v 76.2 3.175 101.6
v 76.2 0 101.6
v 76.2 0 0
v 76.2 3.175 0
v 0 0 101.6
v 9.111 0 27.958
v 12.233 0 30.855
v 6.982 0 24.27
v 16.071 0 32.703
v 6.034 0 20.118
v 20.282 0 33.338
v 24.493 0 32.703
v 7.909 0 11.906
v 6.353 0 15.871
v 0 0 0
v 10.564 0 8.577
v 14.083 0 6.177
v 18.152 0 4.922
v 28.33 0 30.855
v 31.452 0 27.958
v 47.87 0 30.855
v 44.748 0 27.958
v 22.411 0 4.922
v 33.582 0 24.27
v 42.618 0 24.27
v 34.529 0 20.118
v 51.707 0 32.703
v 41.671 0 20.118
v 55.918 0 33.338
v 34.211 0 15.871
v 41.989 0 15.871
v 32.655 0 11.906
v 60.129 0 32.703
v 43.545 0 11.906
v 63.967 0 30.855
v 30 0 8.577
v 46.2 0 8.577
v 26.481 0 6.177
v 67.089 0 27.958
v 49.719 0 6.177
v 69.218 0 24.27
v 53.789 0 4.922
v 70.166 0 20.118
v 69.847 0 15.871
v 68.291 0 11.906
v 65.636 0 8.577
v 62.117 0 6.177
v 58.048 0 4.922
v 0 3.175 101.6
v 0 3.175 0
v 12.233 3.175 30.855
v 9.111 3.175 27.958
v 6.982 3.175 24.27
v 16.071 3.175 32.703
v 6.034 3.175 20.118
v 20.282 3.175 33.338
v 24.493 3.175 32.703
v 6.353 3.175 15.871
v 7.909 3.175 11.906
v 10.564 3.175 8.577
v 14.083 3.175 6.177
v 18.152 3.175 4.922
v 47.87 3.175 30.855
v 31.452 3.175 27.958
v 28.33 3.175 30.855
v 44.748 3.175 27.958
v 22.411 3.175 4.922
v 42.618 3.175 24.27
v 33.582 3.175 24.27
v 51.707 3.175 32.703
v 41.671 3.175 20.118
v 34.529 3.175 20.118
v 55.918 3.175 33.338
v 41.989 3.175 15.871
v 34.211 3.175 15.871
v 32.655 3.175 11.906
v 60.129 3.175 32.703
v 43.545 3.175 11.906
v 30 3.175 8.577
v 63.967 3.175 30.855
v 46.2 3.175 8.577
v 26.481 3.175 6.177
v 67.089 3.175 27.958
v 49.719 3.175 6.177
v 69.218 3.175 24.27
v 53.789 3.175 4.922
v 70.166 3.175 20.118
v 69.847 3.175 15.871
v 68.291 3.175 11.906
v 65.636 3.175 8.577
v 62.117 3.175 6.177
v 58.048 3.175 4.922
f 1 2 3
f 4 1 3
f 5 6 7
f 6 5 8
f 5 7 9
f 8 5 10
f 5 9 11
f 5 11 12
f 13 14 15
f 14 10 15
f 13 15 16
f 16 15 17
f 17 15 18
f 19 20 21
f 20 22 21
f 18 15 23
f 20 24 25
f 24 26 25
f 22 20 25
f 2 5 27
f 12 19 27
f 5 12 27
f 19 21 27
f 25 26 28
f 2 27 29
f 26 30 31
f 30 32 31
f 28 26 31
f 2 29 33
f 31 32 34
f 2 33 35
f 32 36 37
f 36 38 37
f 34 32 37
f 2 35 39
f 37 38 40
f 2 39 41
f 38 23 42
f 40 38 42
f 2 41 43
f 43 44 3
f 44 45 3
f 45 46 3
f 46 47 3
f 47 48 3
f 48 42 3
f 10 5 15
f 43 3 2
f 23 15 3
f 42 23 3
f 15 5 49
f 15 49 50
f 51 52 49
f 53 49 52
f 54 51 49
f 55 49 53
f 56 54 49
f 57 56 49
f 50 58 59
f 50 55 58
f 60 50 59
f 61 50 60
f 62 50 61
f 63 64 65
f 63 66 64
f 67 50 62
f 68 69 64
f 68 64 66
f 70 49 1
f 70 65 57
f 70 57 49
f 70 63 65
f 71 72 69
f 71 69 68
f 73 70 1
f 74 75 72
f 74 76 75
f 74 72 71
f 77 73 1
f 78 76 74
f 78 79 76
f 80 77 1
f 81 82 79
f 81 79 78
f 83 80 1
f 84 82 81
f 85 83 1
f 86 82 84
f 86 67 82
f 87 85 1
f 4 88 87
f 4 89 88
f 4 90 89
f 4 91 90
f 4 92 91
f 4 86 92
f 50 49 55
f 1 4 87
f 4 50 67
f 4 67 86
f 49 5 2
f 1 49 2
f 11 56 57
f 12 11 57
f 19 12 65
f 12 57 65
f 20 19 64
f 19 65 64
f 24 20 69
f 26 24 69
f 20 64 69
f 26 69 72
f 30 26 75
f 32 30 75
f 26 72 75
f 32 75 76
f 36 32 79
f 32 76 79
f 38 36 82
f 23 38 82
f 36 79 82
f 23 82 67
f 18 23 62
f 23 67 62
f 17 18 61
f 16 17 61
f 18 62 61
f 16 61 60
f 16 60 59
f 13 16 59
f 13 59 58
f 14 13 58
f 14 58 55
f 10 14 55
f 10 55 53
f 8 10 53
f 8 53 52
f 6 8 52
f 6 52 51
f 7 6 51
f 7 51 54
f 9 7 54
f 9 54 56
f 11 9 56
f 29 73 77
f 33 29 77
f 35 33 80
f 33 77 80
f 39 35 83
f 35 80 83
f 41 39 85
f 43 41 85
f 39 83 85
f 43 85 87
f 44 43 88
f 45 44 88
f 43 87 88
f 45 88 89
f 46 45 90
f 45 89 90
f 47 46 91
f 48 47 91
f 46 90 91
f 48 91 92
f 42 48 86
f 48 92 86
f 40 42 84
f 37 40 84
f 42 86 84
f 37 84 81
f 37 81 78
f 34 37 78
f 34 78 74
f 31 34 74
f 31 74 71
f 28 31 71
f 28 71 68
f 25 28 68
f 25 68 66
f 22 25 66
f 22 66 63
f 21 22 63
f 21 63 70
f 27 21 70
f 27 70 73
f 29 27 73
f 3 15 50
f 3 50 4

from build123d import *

# Parameters (mm, degrees)
SKETCH1_W           = 76.2
SKETCH1_H           = 101.6
BOSS_EXTRUDE1_DEPTH = 3.175
SKETCH2_R           = 14.2875
CUT_EXTRUDE1_DEPTH  = 28.575


with BuildPart() as part:
    # Sketch1 → Boss-Extrude1 (new body)
    with BuildSketch(Plane(origin=(0, 0, 0), x_dir=(1, 0, 0), z_dir=(0, 1, 0))):
        with Locations((38.1, -50.8)):
            Rectangle(SKETCH1_W, SKETCH1_H)
        Polygon((27.614248419, -19.05), (23.948074209, -12.7), (16.615725791, -12.7), (12.949551581, -19.05), (16.615725791, -25.4), (23.948074209, -25.4), align=None, mode=Mode.SUBTRACT)
        Polygon((55.9181, -11.717651581), (49.5681, -15.383825791), (49.5681, -22.716174209), (55.9181, -26.382348419), (62.2681, -22.716174209), (62.2681, -15.383825791), align=None, mode=Mode.SUBTRACT)
    extrude(amount=BOSS_EXTRUDE1_DEPTH)

    # Sketch2 → Cut-Extrude1 (cut)
    with BuildSketch(Plane(origin=(0, 3.175, 0), x_dir=(1, 0, 0), z_dir=(0, 1, 0))):
        with Locations(Location((20.2819, -19.05, 0), (0, 0, 270))):
            Circle(SKETCH2_R)
        with Locations(Location((55.9181, -19.05, 0), (0, 0, 270))):
            Circle(SKETCH2_R)
    extrude(amount=-CUT_EXTRUDE1_DEPTH, mode=Mode.SUBTRACT)


solid = part.part
